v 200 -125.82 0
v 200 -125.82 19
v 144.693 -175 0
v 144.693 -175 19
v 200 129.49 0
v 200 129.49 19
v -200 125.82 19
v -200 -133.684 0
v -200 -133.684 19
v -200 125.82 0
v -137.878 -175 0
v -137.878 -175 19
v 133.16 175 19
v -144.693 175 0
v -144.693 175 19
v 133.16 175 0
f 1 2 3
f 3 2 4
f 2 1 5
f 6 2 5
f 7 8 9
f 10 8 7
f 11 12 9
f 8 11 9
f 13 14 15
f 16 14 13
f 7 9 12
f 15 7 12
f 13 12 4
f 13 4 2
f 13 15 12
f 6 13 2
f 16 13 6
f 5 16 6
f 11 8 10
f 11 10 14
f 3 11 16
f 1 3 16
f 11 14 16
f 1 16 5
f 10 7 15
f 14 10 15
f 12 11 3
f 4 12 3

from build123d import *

# Parameters (mm, degrees)
F0_W     = 400
F0_H     = 350
F1_DEPTH = 19
F3_DEPTH = 19.001


with BuildPart() as f1:
    # F0 (on Top) → F1 (new body)
    with BuildSketch(Plane.XY):
        Rectangle(F0_W, F0_H)
    extrude(amount=F1_DEPTH)

    # F2 (on face) → F3 (cut, through all)
    with BuildSketch(Plane.XY.offset(19)):
        Polygon((-200, 175), (-200, 125.820249), (-144.6933, 175), align=None)
        Polygon((200, -125.820249), (144.693285, -175), (200, -175), align=None)
        Polygon((-137.878031, -175), (-200, -133.684024), (-200, -175), align=None)
        Polygon((200, 175), (133.159757, 175), (200, 129.490018), align=None)
    extrude(amount=-F3_DEPTH, mode=Mode.SUBTRACT)


solid = f1.part
